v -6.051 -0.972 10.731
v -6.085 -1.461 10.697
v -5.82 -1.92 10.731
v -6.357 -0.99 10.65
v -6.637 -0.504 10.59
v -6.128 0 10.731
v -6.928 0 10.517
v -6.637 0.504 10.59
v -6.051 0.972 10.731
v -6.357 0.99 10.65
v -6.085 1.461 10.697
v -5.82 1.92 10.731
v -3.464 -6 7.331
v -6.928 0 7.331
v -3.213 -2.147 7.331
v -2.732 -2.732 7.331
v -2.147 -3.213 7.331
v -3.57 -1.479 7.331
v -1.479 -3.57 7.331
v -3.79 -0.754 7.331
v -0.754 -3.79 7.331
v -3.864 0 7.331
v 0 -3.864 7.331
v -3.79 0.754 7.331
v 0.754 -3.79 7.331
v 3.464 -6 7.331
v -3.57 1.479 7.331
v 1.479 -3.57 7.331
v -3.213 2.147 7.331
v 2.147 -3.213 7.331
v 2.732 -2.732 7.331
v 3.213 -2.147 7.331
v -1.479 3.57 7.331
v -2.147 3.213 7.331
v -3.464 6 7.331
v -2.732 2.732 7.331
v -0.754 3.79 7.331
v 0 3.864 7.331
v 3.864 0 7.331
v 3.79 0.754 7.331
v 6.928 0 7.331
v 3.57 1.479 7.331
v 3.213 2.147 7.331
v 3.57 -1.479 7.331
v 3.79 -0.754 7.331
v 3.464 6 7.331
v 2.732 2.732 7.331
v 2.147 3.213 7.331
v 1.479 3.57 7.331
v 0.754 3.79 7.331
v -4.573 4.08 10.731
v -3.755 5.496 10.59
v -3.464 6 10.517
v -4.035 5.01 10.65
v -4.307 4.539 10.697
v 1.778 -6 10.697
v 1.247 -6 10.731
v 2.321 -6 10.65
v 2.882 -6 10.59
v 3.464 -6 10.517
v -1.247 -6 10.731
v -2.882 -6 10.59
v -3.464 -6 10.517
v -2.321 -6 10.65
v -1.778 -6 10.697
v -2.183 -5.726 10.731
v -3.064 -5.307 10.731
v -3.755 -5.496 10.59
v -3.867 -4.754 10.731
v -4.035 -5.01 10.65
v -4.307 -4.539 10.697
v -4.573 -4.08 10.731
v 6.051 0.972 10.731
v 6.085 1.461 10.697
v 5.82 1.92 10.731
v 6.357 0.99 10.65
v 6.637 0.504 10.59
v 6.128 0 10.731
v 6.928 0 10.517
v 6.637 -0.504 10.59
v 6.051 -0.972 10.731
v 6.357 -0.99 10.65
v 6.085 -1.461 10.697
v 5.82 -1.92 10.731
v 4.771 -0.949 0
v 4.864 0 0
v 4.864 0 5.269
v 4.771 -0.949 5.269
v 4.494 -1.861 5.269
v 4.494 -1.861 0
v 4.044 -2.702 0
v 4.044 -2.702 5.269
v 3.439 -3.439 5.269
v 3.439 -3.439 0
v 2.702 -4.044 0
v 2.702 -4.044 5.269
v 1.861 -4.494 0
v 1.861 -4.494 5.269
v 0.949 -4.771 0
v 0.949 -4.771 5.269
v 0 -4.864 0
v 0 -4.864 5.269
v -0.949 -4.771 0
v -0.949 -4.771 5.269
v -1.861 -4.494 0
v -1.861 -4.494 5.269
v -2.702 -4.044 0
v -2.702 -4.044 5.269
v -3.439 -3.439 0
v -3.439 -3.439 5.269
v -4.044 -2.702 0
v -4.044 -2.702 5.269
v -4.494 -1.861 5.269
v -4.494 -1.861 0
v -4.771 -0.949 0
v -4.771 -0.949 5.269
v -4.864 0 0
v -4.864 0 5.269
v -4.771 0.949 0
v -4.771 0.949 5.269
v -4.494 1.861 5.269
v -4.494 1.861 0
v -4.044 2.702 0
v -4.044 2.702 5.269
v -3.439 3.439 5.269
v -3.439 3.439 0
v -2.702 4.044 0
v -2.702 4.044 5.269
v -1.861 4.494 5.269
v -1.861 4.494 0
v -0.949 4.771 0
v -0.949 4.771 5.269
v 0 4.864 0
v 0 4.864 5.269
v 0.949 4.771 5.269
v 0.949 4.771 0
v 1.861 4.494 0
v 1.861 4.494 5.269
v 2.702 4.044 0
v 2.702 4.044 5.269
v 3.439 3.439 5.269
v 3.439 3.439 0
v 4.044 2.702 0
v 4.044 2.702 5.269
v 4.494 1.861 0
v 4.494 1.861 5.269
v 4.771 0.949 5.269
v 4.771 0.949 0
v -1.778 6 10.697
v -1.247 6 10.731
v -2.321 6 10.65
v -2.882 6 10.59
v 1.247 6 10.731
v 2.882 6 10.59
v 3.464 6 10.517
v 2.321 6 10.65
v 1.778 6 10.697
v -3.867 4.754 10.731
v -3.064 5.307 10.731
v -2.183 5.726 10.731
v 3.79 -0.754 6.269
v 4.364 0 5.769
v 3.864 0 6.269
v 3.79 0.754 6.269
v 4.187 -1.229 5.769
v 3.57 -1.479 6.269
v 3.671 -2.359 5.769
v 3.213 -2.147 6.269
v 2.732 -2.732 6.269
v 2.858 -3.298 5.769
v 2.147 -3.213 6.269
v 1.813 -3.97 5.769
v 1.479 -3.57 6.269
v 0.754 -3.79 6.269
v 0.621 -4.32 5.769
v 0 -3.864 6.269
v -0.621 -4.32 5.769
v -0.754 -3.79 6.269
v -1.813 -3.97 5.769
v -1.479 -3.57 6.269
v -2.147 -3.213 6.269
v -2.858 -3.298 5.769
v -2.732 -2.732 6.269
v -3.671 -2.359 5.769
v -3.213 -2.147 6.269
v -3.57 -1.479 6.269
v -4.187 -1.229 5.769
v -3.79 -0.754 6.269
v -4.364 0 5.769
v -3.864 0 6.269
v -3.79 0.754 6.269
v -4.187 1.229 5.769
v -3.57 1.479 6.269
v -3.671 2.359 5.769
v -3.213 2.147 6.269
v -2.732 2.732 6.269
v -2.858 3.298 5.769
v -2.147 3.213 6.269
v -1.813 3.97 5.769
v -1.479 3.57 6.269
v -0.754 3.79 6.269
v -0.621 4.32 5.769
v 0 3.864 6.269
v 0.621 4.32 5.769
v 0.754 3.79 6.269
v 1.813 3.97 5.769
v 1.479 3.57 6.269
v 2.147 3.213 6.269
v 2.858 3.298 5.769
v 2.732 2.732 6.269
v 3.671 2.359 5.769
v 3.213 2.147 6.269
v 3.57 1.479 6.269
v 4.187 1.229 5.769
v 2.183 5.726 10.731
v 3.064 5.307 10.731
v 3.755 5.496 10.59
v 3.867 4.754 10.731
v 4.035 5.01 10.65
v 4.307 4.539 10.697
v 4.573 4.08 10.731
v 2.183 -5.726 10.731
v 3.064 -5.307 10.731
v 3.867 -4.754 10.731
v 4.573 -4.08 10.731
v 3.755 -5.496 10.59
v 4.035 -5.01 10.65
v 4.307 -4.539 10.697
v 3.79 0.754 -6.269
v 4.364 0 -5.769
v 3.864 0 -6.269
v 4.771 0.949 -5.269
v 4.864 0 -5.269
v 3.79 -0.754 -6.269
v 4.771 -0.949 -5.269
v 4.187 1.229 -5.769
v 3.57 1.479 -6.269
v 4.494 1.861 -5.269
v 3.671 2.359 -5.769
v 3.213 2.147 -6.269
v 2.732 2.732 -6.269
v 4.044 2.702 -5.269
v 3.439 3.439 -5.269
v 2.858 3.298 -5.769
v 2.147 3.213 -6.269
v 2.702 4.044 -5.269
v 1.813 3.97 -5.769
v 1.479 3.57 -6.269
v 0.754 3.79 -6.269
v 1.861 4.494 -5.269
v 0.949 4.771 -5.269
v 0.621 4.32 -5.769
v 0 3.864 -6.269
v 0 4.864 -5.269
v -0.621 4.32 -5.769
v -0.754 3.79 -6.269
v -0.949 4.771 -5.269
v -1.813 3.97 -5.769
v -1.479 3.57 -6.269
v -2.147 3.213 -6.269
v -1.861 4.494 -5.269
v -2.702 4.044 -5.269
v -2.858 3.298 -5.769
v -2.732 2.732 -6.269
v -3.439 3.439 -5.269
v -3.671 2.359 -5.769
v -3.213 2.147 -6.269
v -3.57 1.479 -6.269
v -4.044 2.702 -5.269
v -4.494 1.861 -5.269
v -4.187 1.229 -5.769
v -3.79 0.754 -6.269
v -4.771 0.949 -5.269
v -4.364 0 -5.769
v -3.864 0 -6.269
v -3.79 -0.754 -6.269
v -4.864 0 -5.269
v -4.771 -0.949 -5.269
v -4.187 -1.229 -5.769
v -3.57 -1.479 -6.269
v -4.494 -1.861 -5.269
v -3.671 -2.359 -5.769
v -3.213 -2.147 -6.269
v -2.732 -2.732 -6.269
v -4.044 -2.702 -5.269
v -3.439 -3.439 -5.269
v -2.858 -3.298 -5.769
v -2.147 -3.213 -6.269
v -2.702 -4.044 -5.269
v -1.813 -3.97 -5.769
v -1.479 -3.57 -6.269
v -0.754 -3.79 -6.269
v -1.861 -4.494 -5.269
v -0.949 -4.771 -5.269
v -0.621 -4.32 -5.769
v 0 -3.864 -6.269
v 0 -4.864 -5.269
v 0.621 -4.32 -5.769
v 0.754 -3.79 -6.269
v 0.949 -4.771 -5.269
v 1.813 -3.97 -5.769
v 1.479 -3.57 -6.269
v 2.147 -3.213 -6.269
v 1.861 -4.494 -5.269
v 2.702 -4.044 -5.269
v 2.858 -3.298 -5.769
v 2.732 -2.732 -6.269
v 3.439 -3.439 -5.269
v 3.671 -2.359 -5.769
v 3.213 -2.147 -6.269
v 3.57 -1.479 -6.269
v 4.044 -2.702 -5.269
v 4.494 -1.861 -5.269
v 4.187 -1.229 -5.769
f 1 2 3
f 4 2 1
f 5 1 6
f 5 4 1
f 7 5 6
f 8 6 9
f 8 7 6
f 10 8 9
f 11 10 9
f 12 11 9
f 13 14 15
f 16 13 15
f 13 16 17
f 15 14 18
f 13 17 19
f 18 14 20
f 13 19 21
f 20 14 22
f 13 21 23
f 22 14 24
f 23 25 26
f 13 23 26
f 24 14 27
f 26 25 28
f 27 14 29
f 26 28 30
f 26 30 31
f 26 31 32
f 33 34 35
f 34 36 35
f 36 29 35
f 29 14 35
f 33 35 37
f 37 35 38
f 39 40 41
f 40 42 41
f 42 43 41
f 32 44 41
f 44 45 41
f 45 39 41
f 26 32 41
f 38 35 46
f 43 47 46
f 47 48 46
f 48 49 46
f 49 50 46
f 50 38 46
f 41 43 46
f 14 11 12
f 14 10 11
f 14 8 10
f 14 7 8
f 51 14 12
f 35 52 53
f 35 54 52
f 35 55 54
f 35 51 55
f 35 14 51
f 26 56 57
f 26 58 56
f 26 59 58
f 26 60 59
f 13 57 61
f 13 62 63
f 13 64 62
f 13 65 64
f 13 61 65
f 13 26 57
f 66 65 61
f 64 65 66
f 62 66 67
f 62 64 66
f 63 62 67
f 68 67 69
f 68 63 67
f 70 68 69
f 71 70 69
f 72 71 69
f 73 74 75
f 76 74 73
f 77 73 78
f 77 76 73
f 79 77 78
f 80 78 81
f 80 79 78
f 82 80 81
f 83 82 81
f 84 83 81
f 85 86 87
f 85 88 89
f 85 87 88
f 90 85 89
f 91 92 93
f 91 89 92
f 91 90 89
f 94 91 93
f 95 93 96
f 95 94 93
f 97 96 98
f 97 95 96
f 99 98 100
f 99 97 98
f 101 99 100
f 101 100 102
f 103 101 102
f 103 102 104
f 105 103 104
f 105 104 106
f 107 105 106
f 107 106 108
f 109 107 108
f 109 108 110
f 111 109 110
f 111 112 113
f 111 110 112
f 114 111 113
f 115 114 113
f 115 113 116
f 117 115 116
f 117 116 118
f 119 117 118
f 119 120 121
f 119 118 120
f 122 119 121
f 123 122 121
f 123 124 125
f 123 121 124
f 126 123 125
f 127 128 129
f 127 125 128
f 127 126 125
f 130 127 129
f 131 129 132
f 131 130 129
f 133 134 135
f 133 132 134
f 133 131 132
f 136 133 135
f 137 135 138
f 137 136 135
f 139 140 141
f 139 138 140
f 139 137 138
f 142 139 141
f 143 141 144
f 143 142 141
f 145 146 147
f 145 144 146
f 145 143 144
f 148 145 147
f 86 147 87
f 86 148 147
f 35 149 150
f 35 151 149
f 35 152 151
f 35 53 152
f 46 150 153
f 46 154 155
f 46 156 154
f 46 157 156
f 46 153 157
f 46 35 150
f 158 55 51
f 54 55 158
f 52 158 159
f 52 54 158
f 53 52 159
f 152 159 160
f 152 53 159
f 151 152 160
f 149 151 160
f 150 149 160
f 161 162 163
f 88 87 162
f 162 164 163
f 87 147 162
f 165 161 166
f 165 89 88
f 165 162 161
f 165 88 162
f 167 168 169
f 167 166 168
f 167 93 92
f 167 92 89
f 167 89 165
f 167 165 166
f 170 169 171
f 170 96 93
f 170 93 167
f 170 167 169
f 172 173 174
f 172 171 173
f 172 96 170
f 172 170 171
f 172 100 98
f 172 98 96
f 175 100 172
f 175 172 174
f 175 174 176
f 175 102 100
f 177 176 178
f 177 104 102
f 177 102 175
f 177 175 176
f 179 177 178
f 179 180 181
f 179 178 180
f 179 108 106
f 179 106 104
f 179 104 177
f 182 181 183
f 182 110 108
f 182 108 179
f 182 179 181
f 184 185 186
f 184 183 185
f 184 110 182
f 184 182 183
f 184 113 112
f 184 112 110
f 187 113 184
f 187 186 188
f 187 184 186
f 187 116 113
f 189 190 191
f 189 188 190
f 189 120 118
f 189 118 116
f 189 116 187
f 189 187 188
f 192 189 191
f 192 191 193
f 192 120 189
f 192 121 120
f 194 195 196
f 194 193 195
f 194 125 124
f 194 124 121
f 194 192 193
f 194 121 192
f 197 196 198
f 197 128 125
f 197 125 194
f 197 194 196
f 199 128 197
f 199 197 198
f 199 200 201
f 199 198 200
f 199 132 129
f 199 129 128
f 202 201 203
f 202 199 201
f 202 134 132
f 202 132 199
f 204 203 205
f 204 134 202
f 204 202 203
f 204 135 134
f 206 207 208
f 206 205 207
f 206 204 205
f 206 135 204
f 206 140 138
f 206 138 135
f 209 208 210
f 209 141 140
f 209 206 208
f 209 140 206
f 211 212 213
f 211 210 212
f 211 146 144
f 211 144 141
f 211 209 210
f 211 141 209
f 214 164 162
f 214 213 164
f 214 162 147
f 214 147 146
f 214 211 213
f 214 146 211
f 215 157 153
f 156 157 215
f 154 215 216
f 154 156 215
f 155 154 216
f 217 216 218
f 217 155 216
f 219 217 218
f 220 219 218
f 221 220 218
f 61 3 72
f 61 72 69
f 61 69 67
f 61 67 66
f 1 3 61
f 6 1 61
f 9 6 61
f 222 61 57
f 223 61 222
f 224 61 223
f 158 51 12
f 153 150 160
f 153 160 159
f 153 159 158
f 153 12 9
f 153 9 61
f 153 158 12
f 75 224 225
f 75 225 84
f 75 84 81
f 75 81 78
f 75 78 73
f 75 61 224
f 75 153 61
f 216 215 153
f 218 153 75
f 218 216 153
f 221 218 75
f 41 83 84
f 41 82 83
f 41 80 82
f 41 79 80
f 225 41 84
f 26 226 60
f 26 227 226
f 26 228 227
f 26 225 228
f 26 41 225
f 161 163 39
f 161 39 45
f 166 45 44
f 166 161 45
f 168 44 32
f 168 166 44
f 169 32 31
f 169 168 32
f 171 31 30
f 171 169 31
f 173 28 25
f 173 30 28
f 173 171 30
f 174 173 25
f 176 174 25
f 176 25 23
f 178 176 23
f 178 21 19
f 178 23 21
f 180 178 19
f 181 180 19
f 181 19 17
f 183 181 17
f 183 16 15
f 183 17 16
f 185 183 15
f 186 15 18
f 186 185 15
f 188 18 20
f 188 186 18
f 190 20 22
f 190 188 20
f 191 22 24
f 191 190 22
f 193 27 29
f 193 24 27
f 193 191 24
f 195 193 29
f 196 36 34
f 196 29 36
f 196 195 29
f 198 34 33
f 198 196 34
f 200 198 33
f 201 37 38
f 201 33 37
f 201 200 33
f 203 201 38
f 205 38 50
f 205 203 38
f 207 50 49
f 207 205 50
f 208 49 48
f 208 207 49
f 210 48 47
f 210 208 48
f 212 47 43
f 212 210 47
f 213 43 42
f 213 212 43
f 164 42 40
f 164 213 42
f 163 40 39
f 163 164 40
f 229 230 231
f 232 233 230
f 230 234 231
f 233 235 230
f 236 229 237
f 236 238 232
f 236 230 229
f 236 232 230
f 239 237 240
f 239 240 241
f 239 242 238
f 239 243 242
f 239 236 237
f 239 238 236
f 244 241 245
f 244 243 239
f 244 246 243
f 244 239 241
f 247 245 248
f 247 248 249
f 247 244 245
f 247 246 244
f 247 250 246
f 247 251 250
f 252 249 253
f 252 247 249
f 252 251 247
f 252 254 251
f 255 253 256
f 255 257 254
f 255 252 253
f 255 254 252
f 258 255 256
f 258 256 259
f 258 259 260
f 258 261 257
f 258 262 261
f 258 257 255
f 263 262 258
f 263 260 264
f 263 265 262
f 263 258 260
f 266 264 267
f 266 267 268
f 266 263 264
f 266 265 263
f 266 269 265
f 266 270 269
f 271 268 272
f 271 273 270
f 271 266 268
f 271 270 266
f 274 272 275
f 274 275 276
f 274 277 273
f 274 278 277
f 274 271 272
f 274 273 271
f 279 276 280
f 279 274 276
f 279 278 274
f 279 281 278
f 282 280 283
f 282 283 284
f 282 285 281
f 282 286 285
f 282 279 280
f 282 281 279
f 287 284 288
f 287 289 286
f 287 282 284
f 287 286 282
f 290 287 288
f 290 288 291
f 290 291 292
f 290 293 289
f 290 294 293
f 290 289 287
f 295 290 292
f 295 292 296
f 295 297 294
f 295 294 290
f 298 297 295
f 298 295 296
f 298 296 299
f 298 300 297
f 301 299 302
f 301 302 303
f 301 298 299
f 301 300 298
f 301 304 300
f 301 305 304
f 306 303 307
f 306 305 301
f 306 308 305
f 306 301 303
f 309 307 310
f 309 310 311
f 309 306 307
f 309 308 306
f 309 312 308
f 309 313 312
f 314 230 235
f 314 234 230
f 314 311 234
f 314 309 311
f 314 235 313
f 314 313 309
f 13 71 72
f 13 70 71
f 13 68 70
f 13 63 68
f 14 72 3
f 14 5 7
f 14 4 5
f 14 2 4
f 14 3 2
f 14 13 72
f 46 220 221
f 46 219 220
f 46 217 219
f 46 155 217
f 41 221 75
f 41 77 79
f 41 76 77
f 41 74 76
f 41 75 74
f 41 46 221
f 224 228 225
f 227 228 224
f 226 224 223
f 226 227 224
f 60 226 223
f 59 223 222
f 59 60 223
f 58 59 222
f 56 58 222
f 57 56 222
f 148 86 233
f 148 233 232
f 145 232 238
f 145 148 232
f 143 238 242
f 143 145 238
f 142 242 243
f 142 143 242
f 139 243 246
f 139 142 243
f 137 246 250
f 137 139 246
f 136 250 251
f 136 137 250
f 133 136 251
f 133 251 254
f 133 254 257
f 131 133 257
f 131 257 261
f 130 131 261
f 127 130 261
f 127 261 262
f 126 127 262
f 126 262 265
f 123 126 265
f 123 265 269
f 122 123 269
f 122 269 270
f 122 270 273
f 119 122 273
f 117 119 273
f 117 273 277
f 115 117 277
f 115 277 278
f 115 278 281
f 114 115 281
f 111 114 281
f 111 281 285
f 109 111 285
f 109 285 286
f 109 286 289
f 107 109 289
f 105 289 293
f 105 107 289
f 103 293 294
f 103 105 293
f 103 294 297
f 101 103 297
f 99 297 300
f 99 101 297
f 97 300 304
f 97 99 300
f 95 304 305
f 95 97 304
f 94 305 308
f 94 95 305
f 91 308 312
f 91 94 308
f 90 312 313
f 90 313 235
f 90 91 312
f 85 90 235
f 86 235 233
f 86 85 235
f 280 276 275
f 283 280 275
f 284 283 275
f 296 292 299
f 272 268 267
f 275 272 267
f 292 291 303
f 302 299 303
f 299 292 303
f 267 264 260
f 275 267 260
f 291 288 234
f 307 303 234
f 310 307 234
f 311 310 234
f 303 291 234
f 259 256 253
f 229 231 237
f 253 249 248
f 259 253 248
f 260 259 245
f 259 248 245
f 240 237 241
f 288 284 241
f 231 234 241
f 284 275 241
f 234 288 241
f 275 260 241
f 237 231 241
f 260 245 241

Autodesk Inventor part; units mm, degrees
ref_plane "YZ Plane" through (0, 0, 0) normal (1, 0, 0) x (0, 1, 0)
ref_plane "XZ Plane" through (0, 0, 0) normal (0, 1, 0) x (-1, 0, 0)
ref_plane "XY Plane" through (0, 0, 0) normal (0, 0, 1) x (1, 0, 0)
sketch "Szkic7" plane through (0, 0, 0) normal (0, 0, 1) x (1, 0, 0)
  circle A0 centre (0, 0) radius 4.864
  dimension "d35" = 9.728
extrude "Wyciągnięcie proste2" add sketch "Szkic7" along normal mid plane 12.5375
chamfer "Faza2" distance 1 angle 45 1 edges at (-4.864, 0, 6.2688)
sketch "Szkic9" plane through (0, 0, 6.2688) normal (0, 0, 1) x (1, 0, 0)
  circle A0 centre (0, 0) radius 3.864 projected
extrude "Wyciągnięcie proste3" add sketch "Szkic9" along normal blind 1.0625
sketch "Szkic10" plane through (0, 0, 7.3313) normal (0, 0, 1) x (1, 0, 0)
  line L0 (-3.4641, 6) -> (3.4641, 6)
  line L1 (3.4641, 6) -> (6.9282, 0)
  line L2 (6.9282, 0) -> (3.4641, -6)
  line L3 (3.4641, -6) -> (-3.4641, -6)
  line L4 (-3.4641, -6) -> (-6.9282, 0)
  line L5 (-6.9282, 0) -> (-3.4641, 6)
  line L6 (0, 8.4) -> (0, -8.4) construction
  line L7 (-9.6995, 0) -> (9.6995, 0) construction
  point P0 (0, 0)
  point P1 (0, 0)
  point P2 (0, 6)
  dimension "d44" = 12
extrude "Wyciągnięcie proste4" add sketch "Szkic10" along normal blind 3.4
sketch "Szkic12" plane through (0, 0, 0) normal (0, 1, 0) x (-1, 0, 0)
  line L0 (0, -2.1463) -> (0, 12.8775) construction
  line L1 (-3.4641, 7.3313) -> (-3.4641, 10.7313) construction
  line L2 (-6.9282, 10.7313) -> (-3.4641, 10.7313) construction
  line L3 (-6.9282, 7.3313) -> (-6.9282, 10.7313) projected
  line L4 (-6.9282, 10.5169) -> (-6.1282, 10.7313)
  line L5 (-6.9282, 10.7313) -> (-3.4641, 10.7313) projected
  line L6 (-6.9282, 7.3313) -> (-3.4641, 7.3313) projected
  point P0 (0, 0)
  dimension "d50" = 15
  dimension "d51" = 0.8
revolve "Obrót2" cut sketch "Szkic12" angle 360 about axis through (0, 0, -10) along (0, 0, 1)
thread "Gwint3" size "G9.728x0.907" designation "G 1/8" class "A" standard "ISO Pipe Threads" full length
chamfer "Faza3" distance 1 angle 45 1 edges at (-4.864, 0, -6.2688)
equation "\"d35\" = OD"
equation "\"d36\" = 0.7375 * L"
equation "\"d42\" = 0.0625 * L"
equation "\"d44\" = SW"
equation "\"d45\" = 0.2 * L"
equation "\"d51\" = 0.0666667 * SW"
equation "\"SzerokośćGięciaPodcięcia\" = Grubość"
equation "\"RozmiarPodcięciaNarożnika\" = 4 * Grubość"
equation "\"PromieńPrzejścia\" = PromieńGięcia"
equation "\"Rozmiar_promienia_Jacobiego\" = PromieńGięcia"
equation "\"Wielk_odstępu\" = Grubość"
equation "\"d2\" = PromieńGięcia"
equation "\"d23\" = PromieńGięcia"
equation "\"OD\" = 9.728"
equation "\"SW\" = 12"
equation "\"L\" = 17"
equation "\"Grubość\" = 1.5"
equation "\"PromieńGięcia\" = 3"
properties part number "Korek sześciokątny BSP 1/8'' L=17" material "304"
